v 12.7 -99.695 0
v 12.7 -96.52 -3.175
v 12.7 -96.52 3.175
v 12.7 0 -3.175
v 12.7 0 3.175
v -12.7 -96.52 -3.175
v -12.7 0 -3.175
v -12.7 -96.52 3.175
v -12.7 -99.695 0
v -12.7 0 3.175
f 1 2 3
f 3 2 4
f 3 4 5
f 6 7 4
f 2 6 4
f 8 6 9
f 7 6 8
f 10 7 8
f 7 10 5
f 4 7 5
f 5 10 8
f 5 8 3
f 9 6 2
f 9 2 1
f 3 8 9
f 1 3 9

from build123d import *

# Parameters (mm, degrees)
F0_W        = 25.4
F0_H        = 6.35
F1_DEPTH    = 101.6
F2_T1_DEPTH = 51.5282991577


# Not quite as in the source:
# - a fillet or chamfer that OpenCascade refuses, or shapes differently, is made with other operations: its cross-section is extruded or revolved along the edge and cut away or added


with BuildPart() as f1:
    # F0 (on Front) → F1 (new body)
    with BuildSketch(Plane.XZ):
        Rectangle(F0_W, F0_H)
    extrude(amount=F1_DEPTH)

    # F2: chamfer of 5.08 on 2 edges, made by hand

    # F2_s2 → F2_t1 (cut)
    with BuildSketch(Plane.YZ.offset(-25.7641495789)):
        Polygon((-96.52, 3.175), (-101.6, -1.905), (-101.6, 3.175), align=None)
        Polygon((-96.52, -3.175), (-101.6, 1.905), (-101.6, -3.175), align=None)
    extrude(amount=F2_T1_DEPTH, mode=Mode.SUBTRACT)


solid = f1.part
